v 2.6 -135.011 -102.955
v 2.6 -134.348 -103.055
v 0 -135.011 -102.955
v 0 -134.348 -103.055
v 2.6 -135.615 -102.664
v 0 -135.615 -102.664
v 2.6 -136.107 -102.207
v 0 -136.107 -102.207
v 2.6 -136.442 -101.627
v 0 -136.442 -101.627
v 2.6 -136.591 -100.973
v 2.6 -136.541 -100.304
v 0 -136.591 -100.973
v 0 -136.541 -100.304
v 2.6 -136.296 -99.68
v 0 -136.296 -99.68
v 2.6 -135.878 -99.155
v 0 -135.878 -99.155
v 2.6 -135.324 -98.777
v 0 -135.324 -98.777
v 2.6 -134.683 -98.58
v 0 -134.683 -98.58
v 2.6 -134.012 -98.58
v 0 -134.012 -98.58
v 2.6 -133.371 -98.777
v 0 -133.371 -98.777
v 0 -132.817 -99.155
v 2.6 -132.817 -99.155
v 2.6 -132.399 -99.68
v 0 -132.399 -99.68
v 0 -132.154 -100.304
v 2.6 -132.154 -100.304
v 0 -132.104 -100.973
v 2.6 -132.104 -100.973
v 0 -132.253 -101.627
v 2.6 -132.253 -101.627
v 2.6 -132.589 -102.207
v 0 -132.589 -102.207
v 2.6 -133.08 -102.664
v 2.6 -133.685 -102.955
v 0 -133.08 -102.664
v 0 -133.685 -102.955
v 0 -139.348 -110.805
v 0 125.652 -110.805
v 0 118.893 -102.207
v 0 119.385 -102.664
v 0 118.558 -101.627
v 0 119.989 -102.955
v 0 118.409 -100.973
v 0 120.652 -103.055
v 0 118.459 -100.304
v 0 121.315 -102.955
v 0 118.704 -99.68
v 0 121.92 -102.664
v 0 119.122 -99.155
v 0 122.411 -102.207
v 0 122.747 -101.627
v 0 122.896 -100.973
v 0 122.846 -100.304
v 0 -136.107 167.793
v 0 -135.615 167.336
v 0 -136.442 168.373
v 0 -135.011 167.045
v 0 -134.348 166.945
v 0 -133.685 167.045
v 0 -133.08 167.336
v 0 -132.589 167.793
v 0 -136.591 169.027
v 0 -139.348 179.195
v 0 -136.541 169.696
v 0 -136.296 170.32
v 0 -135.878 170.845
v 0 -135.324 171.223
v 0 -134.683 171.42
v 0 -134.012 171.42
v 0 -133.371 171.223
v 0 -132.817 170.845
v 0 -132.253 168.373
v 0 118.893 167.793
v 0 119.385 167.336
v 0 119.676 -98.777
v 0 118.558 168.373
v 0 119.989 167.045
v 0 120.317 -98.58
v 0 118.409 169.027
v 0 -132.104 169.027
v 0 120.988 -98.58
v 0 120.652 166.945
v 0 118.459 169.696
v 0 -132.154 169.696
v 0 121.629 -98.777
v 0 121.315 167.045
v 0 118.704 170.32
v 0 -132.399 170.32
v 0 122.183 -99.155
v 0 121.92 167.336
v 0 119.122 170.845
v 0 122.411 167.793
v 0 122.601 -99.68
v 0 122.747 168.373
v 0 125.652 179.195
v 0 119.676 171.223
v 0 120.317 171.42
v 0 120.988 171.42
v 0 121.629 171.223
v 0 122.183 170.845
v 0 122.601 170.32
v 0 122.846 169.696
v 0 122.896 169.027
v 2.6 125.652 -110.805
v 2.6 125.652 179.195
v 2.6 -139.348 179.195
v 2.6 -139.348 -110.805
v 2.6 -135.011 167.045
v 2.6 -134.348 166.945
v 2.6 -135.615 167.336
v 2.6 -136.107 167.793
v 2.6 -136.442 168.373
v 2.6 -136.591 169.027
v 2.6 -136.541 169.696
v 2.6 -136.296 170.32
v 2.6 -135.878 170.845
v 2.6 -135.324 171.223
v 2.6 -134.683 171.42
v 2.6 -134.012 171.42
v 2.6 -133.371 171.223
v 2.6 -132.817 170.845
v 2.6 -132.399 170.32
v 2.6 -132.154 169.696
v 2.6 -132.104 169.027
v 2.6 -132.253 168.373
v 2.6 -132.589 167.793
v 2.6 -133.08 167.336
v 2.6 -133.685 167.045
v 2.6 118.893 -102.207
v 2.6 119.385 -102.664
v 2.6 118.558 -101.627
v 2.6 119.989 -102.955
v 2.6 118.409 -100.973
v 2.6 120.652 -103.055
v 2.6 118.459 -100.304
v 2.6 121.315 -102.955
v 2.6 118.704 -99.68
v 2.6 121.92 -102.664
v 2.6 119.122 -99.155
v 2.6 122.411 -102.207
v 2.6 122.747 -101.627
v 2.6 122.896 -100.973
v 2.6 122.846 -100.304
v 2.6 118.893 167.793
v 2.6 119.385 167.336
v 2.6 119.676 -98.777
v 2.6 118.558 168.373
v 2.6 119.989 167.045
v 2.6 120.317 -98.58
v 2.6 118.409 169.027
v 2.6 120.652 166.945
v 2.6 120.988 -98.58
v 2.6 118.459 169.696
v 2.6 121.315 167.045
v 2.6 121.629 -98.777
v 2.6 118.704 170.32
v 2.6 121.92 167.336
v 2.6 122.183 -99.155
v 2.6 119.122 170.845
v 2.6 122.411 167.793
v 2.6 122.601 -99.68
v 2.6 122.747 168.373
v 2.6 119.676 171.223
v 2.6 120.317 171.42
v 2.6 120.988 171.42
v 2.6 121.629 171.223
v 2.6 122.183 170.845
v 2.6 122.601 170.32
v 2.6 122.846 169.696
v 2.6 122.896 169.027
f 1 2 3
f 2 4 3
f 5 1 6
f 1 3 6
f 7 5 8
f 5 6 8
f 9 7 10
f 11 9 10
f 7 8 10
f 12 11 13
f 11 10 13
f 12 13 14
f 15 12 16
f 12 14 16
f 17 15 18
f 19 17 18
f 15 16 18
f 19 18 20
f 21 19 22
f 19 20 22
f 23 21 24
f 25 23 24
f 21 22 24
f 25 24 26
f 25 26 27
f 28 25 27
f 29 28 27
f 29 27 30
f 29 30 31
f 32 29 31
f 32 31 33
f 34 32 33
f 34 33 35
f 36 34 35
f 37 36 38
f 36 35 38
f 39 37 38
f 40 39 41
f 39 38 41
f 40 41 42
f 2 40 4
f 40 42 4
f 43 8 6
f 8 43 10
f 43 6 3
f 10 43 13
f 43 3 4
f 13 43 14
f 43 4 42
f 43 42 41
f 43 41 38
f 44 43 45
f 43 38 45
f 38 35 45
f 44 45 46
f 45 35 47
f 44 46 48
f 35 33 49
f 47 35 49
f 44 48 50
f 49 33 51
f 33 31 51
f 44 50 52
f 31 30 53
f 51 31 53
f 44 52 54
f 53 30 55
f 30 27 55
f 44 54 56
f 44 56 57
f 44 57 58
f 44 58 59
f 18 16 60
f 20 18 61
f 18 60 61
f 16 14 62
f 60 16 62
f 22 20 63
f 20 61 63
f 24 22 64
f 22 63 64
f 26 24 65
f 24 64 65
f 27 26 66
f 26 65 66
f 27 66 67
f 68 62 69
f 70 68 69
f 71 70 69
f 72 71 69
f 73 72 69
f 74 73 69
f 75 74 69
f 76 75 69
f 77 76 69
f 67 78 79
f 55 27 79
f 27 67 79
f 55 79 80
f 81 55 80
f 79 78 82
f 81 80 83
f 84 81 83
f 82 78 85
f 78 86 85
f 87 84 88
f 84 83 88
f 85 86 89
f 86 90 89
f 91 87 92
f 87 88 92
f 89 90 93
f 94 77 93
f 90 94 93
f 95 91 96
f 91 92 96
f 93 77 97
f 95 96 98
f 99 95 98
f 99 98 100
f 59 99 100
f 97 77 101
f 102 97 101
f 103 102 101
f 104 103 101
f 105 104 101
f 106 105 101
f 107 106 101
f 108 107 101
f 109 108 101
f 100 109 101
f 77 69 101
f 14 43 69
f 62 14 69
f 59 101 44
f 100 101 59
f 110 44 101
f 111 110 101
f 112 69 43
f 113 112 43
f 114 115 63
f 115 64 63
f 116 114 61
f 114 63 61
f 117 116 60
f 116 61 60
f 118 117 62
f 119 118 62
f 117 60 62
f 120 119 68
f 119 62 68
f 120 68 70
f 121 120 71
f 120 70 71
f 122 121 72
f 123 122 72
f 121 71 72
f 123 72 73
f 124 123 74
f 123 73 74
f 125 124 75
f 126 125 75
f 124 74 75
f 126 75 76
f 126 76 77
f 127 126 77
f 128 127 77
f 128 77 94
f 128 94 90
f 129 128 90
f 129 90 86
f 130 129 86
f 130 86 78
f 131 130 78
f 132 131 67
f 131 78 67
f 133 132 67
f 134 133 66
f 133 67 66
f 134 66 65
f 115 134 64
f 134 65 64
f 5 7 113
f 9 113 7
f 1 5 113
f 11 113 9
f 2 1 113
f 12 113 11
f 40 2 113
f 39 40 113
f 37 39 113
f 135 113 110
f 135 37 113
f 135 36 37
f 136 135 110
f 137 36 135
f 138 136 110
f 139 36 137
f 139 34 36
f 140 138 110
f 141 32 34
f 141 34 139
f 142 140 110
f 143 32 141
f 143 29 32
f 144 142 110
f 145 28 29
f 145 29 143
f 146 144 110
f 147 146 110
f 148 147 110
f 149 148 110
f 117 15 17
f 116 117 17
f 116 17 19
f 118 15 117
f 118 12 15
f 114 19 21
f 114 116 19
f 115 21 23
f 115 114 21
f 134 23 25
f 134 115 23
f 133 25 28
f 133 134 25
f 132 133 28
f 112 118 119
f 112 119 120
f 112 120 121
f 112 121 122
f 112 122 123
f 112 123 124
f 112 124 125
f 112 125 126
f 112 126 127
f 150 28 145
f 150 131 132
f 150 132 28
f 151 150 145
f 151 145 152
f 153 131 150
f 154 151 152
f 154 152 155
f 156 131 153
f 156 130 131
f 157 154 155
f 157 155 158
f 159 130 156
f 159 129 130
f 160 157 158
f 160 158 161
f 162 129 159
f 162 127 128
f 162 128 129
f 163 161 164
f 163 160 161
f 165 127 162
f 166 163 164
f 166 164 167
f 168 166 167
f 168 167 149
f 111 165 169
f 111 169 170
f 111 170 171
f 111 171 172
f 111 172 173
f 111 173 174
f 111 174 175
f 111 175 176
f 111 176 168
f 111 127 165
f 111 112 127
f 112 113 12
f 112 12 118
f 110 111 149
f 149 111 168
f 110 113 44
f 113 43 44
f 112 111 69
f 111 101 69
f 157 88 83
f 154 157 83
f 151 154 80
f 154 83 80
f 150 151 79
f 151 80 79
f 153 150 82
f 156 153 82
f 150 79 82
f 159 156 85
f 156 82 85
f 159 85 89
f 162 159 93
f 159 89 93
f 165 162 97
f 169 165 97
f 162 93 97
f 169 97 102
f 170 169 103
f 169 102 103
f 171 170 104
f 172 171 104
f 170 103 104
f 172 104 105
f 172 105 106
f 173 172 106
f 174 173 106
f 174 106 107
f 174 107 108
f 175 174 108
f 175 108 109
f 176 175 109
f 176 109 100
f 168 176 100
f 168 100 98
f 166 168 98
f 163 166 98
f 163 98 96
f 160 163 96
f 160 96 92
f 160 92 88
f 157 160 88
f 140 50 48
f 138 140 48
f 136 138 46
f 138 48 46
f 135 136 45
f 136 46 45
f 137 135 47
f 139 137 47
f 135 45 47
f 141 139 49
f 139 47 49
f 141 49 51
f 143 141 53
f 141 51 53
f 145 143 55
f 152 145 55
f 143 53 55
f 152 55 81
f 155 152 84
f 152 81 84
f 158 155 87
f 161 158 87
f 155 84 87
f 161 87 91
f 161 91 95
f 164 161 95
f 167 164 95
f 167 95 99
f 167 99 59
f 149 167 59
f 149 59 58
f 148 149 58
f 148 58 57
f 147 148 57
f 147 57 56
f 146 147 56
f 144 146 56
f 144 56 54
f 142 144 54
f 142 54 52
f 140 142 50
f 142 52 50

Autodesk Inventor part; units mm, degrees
ref_plane "YZ Plane" through (0, 0, 0) normal (1, 0, 0) x (0, 1, 0)
ref_plane "XZ Plane" through (0, 0, 0) normal (0, 1, 0) x (-1, 0, 0)
ref_plane "XY Plane" through (0, 0, 0) normal (0, 0, 1) x (1, 0, 0)
sketch "スケッチ1" plane through (0, 0, 0) normal (1, 0, 0) x (0, 1, 0)
  line L0 (125.6523, 179.1954) -> (-139.3477, 179.1954)
  line L1 (-139.3477, 179.1954) -> (-139.3477, -110.8046)
  line L2 (-139.3477, -110.8046) -> (125.6523, -110.8046)
  line L3 (125.6523, -110.8046) -> (125.6523, 179.1954)
  point P0 (0, 0)
  dimension "d0" = 265
  dimension "d1" = 290
extrude "押し出し1" add sketch "スケッチ1" along normal blind 2.6
sketch "スケッチ2" plane through (2.6, 0, 0) normal (1, 0, 0) x (0, 0, -1)
  line L0 (-179.1954, 125.6523) -> (-179.1954, -139.3477) projected
  line L1 (-179.1954, -139.3477) -> (110.8046, -139.3477) projected
  line L2 (110.8046, -139.3477) -> (110.8046, 125.6523) projected
  line L3 (110.8046, 125.6523) -> (-179.1954, 125.6523) projected
  line L4 (-34.1954, -6.8477) -> (-34.1954, 125.6523)
  line L5 (110.8046, 125.6523) -> (-179.1954, 125.6523) projected
  line L6 (-34.1954, -6.8477) -> (110.8046, -6.8477)
  point P0 (0, 0)
  point P1 (-169.1954, 120.6523)
  point P2 (100.8046, 120.6523)
  point P3 (-169.1954, -134.3477)
  point P4 (100.8046, -134.3477)
  dimension "d4" = 5
  dimension "d5" = 10
hole "穴1" at (2.6, 120.6523, 169.1954) at (2.6, 120.6523, -100.8046) at (2.6, -134.3477, 169.1954) at (2.6, -134.3477, -100.8046) direction (-1, 0, 0) diameter 4.5 depth 10 tip angle 118
properties part number "lc_box_side" material "ポリカーボネート、クリア"
